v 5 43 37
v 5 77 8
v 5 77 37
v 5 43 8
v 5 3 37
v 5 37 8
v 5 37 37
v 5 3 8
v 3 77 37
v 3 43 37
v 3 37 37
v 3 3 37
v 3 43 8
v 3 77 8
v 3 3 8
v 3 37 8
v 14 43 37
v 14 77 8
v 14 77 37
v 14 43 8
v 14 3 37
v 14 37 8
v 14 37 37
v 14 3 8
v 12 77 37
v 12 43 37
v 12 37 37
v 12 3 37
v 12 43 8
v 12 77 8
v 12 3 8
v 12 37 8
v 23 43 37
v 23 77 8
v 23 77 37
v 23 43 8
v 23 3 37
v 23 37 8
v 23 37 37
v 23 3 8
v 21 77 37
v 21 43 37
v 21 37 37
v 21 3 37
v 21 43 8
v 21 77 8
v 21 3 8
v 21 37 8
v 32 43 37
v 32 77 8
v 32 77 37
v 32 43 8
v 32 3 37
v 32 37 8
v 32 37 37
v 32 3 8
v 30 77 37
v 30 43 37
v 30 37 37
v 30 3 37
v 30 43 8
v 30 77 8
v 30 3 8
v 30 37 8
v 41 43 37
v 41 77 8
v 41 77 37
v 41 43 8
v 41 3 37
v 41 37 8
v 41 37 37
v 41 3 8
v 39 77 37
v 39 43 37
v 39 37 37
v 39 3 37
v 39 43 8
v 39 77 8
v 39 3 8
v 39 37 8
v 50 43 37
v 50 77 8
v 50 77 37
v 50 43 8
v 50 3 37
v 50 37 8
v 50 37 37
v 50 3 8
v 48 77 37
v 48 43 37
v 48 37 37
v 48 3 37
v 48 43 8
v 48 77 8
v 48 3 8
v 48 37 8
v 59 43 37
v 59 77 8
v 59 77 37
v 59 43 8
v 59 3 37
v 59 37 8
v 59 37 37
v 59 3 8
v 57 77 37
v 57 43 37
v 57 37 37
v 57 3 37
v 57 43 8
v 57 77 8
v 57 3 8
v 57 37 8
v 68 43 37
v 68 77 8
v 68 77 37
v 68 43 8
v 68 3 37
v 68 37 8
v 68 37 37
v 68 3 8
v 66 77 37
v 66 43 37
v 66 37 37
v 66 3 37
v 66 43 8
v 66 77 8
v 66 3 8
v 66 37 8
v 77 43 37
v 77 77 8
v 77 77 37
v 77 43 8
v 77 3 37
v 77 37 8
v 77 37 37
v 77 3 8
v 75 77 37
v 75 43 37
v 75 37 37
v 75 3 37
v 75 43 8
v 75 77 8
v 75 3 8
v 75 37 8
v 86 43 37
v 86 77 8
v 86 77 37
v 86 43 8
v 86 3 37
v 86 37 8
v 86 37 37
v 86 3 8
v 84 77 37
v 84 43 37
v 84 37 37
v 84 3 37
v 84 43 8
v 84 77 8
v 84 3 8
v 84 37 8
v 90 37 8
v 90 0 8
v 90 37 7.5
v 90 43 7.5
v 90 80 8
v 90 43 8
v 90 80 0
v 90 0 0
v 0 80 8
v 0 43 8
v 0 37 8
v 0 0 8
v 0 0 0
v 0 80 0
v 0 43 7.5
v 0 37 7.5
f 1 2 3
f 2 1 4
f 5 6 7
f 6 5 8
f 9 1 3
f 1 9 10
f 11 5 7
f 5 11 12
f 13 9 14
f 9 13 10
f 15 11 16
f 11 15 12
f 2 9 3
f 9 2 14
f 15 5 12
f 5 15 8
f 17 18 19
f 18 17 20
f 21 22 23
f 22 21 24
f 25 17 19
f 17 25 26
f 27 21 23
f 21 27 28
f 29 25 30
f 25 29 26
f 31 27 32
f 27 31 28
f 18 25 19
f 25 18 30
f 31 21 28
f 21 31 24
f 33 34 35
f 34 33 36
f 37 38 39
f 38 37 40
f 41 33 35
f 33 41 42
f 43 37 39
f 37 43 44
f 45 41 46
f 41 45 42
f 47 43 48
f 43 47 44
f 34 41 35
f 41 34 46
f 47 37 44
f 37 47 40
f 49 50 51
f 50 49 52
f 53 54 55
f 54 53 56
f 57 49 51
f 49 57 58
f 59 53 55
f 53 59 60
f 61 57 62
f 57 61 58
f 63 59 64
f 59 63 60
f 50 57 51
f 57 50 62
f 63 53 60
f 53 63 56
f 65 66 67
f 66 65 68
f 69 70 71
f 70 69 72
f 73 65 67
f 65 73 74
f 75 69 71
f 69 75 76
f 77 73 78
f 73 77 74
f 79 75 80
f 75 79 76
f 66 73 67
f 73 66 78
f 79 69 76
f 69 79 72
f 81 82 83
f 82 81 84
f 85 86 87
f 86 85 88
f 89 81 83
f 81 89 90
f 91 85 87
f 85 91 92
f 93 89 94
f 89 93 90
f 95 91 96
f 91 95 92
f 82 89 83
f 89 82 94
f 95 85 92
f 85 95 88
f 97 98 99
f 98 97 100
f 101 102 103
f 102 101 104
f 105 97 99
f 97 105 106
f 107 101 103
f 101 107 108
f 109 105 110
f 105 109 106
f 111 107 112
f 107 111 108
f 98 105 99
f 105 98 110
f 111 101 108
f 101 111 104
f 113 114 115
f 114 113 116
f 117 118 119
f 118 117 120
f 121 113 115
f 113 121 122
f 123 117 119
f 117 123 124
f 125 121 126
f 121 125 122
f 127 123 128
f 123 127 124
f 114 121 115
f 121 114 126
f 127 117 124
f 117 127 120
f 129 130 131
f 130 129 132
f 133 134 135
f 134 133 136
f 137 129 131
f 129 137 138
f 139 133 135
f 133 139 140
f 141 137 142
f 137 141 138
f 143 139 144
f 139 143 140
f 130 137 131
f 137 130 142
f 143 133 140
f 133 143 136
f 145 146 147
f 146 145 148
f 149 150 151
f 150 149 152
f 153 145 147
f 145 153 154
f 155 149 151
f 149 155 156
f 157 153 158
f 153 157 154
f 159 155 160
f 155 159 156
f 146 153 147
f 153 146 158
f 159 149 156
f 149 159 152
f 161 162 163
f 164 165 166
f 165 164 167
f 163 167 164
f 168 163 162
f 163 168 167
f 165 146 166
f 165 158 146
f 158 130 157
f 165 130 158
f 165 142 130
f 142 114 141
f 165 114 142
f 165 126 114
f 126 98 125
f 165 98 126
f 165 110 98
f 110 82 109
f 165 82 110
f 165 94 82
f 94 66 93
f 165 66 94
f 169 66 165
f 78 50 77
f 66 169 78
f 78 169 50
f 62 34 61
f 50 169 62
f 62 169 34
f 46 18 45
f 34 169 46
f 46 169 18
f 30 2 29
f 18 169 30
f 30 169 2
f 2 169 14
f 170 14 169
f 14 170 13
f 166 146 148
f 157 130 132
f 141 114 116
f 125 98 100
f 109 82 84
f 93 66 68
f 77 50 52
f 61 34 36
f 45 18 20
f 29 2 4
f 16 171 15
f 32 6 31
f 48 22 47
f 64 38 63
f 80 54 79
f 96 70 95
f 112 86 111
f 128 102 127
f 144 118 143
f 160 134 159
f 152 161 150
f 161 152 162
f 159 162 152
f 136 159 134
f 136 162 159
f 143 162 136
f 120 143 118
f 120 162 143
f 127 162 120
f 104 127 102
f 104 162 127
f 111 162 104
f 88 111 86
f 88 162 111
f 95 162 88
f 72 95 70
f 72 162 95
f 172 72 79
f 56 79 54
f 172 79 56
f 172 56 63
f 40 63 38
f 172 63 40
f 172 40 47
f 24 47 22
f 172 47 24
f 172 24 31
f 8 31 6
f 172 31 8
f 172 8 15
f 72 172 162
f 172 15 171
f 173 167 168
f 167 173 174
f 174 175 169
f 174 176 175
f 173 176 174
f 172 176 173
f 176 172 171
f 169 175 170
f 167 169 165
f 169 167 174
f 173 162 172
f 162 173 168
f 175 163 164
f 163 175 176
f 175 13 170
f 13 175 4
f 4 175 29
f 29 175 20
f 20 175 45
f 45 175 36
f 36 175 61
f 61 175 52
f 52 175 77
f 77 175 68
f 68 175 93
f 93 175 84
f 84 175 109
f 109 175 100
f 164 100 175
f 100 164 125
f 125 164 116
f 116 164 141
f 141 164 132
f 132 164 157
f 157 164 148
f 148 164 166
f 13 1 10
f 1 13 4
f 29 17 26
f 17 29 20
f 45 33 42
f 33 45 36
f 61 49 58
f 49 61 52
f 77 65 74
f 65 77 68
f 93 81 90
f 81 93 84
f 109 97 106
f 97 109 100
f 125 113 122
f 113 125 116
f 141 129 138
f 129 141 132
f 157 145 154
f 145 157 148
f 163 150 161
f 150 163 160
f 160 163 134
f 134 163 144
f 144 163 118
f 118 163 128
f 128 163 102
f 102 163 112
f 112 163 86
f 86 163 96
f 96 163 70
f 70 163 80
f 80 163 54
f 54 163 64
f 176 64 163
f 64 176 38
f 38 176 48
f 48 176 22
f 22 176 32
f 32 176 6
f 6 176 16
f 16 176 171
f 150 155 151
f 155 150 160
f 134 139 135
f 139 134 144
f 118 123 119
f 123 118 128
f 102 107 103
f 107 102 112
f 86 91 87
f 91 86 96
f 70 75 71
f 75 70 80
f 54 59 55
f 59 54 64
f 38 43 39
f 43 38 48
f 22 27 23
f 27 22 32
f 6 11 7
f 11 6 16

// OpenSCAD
$fn = 32;

// ----------------------------------------------------------------------
// Heatsink: slotted fin block
// ----------------------------------------------------------------------

// --- parameters (mm) ---
base_l = 90;              // base length, X
base_w = 80;              // base width, Y
base_t = 8;               // base plate thickness
fin_h = 30;               // fin height above the base
fin_t = 2;                // fin thickness
edge = 3;                 // margin from the base ends
pitch = 9;                // fin pitch
slot_w = 6;               // central slot width, Y

n_fins = floor((base_l - 2 * edge - fin_t) / pitch) + 1;  // fin count
total_h = base_t + fin_h - 1;  // overall height

difference() {
union() {
  cube([base_l, base_w, base_t]);
  for (i = [0 : n_fins - 1])
    translate([edge + i * pitch, edge, base_t - 1])
      cube([fin_t, base_w - 2 * edge, fin_h]);
}
  translate([-1, base_w / 2 - slot_w / 2, base_t - 0.5])
    cube([base_l + 2, slot_w, fin_h + 2]);
}
